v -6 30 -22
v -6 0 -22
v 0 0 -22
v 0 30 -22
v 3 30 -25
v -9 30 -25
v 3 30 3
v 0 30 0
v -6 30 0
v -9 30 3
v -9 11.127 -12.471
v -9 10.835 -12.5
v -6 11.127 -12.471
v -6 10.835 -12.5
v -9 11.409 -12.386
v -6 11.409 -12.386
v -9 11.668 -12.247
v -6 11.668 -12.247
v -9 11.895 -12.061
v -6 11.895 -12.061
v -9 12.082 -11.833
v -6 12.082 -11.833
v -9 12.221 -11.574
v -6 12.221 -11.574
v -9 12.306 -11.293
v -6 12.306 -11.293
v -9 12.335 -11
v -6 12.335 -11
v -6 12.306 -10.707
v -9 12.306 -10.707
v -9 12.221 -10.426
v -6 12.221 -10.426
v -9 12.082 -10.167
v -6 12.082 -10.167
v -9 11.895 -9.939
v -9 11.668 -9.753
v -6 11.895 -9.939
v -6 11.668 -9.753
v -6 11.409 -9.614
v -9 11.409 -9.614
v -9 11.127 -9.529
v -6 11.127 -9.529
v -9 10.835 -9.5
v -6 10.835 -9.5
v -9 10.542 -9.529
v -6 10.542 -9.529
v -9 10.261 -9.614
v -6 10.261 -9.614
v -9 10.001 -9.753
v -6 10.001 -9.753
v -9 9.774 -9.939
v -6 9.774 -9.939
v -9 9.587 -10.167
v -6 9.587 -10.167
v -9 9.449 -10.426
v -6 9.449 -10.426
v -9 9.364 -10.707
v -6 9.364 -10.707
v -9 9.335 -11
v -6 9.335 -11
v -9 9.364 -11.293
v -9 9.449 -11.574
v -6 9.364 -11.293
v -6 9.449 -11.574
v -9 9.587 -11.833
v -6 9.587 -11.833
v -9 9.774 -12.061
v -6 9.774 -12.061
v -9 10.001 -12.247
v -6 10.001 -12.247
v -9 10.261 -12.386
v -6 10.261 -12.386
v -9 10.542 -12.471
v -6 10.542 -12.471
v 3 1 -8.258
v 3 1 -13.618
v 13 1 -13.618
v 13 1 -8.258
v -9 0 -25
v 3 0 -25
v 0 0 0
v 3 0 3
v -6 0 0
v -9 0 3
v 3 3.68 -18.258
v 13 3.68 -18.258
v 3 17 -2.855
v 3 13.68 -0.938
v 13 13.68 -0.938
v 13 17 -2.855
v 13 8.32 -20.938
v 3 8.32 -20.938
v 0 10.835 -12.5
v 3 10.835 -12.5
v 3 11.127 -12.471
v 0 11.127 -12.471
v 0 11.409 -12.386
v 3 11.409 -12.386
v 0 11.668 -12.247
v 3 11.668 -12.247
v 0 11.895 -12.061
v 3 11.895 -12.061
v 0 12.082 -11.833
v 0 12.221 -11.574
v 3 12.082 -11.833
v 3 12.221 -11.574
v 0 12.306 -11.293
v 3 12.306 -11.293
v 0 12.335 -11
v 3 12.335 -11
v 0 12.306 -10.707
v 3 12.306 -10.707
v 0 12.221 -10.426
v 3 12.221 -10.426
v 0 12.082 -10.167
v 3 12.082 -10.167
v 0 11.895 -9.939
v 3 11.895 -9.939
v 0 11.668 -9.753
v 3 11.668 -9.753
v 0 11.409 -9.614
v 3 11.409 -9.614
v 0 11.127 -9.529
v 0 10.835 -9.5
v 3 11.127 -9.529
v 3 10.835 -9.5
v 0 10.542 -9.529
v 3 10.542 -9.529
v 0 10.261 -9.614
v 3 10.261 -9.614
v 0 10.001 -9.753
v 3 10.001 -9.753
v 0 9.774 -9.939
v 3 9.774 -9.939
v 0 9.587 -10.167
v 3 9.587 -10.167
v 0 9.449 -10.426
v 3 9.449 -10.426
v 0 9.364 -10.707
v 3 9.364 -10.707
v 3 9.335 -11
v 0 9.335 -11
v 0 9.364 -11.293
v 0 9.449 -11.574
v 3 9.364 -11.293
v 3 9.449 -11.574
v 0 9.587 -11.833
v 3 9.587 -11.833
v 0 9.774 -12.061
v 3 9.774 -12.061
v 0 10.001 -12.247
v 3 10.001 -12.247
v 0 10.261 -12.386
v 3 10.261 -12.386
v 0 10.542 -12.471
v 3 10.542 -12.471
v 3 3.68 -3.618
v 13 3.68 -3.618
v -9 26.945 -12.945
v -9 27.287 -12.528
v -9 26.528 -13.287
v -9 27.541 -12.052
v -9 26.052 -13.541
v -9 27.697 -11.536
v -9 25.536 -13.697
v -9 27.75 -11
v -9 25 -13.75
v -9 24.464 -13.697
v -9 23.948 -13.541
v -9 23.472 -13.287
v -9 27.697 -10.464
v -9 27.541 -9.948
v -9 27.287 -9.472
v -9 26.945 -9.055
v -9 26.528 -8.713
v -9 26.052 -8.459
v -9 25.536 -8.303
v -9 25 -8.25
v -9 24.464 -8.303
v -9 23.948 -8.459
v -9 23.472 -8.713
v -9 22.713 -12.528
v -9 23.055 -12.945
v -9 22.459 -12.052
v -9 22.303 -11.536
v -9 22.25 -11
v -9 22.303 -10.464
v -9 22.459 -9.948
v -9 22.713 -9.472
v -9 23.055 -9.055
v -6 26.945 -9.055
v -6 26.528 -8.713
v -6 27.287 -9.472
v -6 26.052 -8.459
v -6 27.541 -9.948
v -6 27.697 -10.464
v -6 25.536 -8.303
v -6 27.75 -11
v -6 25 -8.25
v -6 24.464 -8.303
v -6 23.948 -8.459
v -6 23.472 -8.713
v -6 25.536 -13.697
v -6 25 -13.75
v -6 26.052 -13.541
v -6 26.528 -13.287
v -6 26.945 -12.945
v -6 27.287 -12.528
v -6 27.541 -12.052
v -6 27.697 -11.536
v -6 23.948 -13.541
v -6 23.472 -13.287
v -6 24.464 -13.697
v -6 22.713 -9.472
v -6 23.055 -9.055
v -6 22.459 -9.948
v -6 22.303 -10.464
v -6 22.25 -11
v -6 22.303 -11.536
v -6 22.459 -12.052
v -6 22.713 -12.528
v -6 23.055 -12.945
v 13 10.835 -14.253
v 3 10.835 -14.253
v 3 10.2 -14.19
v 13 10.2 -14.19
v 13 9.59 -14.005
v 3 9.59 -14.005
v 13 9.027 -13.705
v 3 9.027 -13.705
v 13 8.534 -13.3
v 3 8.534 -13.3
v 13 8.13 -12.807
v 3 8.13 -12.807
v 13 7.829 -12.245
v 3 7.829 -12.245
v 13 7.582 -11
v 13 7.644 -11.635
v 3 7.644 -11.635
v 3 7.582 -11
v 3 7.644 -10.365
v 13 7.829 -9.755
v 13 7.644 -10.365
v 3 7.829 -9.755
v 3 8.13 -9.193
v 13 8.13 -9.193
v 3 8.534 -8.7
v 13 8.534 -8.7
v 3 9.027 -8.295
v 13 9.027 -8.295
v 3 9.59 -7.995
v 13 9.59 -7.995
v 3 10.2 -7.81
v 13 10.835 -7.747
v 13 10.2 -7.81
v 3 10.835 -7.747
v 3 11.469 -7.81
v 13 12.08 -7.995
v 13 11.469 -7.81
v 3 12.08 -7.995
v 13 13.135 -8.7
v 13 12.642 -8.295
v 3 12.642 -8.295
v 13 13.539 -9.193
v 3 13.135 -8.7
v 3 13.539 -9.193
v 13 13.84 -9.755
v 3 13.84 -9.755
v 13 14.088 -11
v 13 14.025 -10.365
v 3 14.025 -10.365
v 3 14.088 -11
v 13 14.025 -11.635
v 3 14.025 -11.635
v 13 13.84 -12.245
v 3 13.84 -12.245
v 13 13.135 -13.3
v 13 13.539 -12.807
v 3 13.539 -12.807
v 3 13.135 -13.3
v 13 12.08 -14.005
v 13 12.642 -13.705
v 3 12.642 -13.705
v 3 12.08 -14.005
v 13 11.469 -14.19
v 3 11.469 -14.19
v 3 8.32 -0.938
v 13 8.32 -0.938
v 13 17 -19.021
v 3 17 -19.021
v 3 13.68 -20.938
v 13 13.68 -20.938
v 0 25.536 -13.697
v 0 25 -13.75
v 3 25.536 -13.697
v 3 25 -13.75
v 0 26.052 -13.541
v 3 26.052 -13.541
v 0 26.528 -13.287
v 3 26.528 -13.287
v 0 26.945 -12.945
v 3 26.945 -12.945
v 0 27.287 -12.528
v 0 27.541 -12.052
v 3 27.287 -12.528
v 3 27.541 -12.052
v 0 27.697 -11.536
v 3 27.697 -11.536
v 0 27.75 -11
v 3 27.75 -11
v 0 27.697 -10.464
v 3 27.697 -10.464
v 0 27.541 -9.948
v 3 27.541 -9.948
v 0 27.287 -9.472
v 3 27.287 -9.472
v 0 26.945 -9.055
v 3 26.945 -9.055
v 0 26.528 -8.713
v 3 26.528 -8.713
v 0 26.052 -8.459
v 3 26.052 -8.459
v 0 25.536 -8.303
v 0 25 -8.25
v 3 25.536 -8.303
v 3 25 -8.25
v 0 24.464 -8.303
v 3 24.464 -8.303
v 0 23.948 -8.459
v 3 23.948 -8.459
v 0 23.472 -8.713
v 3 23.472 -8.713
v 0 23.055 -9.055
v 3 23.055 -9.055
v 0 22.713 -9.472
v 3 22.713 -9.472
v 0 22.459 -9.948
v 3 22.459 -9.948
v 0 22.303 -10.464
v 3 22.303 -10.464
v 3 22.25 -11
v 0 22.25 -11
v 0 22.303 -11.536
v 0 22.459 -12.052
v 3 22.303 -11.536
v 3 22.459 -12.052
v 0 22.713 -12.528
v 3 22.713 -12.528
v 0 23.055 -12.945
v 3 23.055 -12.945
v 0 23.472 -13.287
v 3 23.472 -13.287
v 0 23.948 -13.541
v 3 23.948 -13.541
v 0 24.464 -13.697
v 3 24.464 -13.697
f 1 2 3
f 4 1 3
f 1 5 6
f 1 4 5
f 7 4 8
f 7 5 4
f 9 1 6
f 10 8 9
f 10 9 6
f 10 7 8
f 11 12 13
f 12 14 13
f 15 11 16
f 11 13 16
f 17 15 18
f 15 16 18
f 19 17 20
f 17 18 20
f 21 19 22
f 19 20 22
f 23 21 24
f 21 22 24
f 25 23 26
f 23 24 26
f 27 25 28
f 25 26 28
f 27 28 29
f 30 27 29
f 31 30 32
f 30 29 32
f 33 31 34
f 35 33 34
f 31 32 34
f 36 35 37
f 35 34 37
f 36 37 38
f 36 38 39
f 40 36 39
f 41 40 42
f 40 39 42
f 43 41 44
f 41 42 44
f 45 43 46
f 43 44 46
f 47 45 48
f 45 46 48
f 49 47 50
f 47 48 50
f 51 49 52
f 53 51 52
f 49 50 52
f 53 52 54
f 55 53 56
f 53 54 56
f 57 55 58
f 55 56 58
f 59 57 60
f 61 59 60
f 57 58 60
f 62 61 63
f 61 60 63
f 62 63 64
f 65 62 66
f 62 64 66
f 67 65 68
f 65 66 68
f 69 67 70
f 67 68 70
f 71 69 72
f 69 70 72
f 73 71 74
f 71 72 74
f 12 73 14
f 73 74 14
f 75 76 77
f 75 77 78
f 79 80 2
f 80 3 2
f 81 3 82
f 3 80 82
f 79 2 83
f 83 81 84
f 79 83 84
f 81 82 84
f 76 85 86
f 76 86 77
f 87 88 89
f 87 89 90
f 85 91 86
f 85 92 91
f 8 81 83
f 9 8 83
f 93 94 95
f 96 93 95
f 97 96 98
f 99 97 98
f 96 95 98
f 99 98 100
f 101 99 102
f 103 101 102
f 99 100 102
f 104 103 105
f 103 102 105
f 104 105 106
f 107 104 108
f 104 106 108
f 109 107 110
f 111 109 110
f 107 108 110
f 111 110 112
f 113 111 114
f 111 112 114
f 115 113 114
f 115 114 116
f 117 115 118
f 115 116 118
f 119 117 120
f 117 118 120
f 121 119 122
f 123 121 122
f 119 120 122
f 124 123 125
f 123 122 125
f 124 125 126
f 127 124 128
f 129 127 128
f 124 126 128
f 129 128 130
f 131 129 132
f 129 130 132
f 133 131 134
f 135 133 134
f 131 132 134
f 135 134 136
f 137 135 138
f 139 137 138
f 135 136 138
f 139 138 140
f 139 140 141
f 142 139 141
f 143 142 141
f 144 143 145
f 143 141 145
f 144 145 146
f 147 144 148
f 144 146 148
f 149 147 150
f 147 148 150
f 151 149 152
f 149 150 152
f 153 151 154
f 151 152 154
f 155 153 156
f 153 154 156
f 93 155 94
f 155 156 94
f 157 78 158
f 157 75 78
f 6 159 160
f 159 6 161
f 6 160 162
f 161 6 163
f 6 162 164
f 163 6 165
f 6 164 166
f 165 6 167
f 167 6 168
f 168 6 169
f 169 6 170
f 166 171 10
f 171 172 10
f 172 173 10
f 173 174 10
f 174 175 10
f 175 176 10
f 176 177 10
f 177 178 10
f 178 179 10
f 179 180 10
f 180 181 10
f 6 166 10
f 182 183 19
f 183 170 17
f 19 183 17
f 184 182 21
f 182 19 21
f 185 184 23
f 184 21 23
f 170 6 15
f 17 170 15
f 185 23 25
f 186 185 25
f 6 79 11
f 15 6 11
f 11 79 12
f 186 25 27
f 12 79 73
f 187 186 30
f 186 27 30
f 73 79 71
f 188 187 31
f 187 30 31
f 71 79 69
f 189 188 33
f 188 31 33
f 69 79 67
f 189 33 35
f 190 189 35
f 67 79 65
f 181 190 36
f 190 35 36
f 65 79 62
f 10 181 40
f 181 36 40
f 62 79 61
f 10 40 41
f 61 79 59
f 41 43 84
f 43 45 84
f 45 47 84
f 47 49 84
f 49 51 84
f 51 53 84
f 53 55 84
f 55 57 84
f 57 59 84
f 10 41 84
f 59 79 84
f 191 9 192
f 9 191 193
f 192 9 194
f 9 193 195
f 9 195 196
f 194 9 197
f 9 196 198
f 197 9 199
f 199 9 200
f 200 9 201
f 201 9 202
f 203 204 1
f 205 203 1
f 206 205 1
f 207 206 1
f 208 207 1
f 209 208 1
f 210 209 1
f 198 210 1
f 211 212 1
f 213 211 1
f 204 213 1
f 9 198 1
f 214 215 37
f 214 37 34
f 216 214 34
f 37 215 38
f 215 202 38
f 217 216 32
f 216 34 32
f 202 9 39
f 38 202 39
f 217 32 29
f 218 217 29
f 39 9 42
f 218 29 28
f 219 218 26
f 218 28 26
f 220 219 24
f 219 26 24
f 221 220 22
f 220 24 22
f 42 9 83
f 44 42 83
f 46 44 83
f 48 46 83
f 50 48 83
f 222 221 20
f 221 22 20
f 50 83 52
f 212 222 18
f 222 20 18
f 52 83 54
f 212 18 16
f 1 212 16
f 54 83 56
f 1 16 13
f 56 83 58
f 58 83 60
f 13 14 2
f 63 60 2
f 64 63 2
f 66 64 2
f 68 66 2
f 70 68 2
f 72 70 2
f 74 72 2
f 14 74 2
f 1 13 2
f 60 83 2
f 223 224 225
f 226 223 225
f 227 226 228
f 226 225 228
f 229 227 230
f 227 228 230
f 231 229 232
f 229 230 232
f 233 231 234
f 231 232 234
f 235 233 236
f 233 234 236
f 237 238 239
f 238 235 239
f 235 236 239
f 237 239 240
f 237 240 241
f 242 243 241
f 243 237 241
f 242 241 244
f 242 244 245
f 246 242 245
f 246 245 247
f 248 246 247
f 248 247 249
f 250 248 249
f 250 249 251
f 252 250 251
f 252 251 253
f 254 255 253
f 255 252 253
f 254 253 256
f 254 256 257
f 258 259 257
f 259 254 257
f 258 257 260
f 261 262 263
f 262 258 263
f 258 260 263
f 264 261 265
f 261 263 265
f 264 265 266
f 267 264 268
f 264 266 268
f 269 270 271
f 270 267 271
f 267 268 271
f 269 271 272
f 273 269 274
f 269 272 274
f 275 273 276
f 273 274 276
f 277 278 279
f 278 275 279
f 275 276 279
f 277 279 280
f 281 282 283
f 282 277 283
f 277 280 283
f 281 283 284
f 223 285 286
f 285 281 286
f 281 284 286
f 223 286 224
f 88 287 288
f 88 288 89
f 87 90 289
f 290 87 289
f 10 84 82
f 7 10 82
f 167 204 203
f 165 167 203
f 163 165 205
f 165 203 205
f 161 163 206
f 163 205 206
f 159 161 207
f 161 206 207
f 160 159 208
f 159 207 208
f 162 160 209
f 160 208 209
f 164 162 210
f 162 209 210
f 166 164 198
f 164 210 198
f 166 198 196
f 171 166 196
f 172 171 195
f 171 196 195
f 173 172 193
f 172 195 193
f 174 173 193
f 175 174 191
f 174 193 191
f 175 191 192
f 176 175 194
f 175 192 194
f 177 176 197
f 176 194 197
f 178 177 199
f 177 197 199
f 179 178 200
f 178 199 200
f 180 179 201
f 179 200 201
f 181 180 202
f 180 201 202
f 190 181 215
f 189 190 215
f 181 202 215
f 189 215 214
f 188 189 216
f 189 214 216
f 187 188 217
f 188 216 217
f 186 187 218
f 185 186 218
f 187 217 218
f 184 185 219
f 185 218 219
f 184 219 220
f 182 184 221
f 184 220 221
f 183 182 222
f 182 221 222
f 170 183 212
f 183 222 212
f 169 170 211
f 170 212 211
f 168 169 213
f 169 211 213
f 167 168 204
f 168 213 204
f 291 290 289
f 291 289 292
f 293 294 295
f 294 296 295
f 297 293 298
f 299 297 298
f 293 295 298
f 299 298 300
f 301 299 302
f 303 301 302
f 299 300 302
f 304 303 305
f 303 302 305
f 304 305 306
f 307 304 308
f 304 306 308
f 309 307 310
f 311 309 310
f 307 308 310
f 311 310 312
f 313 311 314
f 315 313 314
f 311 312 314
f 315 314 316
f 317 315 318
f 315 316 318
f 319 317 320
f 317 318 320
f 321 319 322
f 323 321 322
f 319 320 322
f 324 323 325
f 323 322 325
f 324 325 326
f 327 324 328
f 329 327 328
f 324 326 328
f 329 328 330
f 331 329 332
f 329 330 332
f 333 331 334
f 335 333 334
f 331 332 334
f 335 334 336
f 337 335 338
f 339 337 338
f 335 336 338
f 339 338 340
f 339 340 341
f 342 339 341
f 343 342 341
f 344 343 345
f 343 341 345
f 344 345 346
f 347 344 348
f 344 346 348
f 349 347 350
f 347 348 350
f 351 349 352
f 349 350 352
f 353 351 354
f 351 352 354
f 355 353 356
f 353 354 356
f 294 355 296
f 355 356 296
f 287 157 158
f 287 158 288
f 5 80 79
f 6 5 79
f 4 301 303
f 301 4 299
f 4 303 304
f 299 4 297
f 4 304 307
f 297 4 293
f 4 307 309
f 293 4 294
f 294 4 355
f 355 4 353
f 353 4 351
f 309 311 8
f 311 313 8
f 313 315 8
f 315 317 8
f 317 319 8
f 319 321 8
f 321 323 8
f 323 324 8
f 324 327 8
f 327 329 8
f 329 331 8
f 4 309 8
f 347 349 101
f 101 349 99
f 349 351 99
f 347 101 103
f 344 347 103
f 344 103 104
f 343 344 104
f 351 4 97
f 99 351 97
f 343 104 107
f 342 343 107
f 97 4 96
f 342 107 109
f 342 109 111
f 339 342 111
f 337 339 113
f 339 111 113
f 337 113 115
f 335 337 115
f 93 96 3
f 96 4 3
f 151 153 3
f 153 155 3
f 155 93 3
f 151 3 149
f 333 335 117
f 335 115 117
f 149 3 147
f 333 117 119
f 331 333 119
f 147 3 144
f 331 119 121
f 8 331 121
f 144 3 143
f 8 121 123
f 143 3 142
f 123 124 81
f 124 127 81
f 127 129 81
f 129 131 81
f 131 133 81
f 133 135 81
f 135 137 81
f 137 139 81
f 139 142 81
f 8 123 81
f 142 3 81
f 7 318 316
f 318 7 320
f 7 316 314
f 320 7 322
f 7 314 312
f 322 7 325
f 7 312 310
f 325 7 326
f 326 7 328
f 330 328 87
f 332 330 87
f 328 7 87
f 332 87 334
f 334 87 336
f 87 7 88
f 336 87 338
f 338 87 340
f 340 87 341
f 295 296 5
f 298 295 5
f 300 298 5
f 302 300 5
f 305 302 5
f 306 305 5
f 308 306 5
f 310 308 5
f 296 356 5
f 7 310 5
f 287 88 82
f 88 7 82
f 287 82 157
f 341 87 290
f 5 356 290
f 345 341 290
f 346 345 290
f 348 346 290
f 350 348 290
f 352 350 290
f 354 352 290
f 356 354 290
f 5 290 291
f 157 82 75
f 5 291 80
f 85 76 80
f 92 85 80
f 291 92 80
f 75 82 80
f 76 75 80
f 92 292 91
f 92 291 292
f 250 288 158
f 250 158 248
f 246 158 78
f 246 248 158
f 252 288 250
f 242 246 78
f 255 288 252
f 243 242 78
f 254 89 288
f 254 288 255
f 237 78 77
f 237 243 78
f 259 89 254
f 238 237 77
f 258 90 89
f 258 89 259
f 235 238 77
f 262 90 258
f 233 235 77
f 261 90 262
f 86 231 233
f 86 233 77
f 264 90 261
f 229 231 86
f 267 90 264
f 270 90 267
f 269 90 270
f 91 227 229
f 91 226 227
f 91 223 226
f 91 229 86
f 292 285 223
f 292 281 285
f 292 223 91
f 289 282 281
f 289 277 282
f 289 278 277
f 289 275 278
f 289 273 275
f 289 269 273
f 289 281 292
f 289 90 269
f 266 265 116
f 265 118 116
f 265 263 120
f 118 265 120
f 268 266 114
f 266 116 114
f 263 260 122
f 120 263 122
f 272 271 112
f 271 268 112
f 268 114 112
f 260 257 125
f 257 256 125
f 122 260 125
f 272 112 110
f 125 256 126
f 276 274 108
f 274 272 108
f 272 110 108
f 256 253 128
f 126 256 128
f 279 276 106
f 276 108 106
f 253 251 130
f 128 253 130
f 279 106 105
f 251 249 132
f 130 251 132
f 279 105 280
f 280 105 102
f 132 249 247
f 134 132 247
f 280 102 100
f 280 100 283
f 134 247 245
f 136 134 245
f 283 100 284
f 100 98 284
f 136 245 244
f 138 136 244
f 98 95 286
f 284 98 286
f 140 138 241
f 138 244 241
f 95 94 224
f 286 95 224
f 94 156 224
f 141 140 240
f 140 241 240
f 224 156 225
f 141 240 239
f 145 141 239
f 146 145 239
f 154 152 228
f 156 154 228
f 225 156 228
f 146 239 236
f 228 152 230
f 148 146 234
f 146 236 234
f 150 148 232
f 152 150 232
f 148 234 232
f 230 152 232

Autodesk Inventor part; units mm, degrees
ref_plane "YZ Plane" through (0, 0, 0) normal (1, 0, 0) x (0, 1, 0)
ref_plane "XZ Plane" through (0, 0, 0) normal (0, 1, 0) x (-1, 0, 0)
ref_plane "XY Plane" through (0, 0, 0) normal (0, 0, 1) x (1, 0, 0)
sketch "Sketch1" plane through (0, 0, 0) normal (0, 1, 0) x (-1, 0, 0)
  line L0 (0, 0) -> (6, 0)
  line L1 (6, 0) -> (6, -22)
  line L2 (6, -22) -> (0, -22)
  line L3 (0, -22) -> (0, 0)
  line L4 (9, 3) -> (-3, 3)
  line L5 (-3, 3) -> (-3, -25)
  line L6 (-3, -25) -> (9, -25)
  line L7 (9, -25) -> (9, 3)
  point P0 (3, 0)
  point P1 (3, -25)
  dimension "d0" = 22
  dimension "d1" = 6
  dimension "d2" = 3
  dimension "d3" = 3
  dimension "d4" = 3
  dimension "d5" = 3
extrude "Extrusion1" add sketch "Sketch1" along normal blind 30
sketch "Sketch2" plane through (3, 0, 3) normal (1, 0, 0) x (0, 0, -1)
  circle A0 centre (14, 25) radius 2.75
  line L0 (0, 30) -> (28, 30) projected
  point P0 (3, 0)
  dimension "d8" = 5.5
  dimension "d11" = 5
extrude "Extrusion2" cut sketch "Sketch2" against normal blind 30
sketch "Sketch3" plane through (3, 0, 3) normal (1, 0, 0) x (0, 0, -1)
  line L0 (6.6175, 3.6795) -> (3.938, 8.3205)
  line L1 (3.938, 8.3205) -> (3.938, 13.6795)
  line L2 (3.938, 13.6795) -> (6.6175, 18.3205)
  line L3 (6.6175, 18.3205) -> (11.2585, 21)
  line L4 (11.2585, 21) -> (16.6175, 21)
  line L5 (16.6175, 21) -> (21.2585, 18.3205)
  line L6 (21.2585, 18.3205) -> (23.938, 13.6795)
  line L7 (23.938, 13.6795) -> (23.938, 8.3205)
  line L8 (23.938, 8.3205) -> (21.2585, 3.6795)
  line L9 (21.2585, 3.6795) -> (16.6175, 1)
  line L10 (16.6175, 1) -> (11.2585, 1)
  line L11 (11.2585, 1) -> (6.6175, 3.6795)
  line L12 (0, 30) -> (28, 30) projected
  circle A0 centre (14, 10.8347) radius 3.253
  point P0 (3, 0)
  point P1 (13.938, 11)
  dimension "d12" = 10
  dimension "d13" = 19
extrude "Extrusion3" add sketch "Sketch3" along normal blind 10
sketch "Sketch5" plane through (3, 10.8347, -11) normal (1, 0, 0) x (0, 0, -1)
  circle A0 centre (0, 0) radius 1.5
  point P0 (-11, -10.8347)
  dimension "d18" = 3
extrude "Extrusion5" cut sketch "Sketch5" against normal blind 12
sketch "Sketch6" plane through (13, 0, 3) normal (1, 0, 0) x (0, 0, -1)
  line L0 (23, 22) -> (5, 22)
  line L1 (5, 22) -> (5, 17)
  line L2 (5, 17) -> (23, 17)
  line L3 (23, 17) -> (23, 22)
  line L4 (28, 0) -> (28, 30) projected
  line L5 (0, 0) -> (0, 30) projected
  line L6 (0, 30) -> (28, 30) projected
  point P0 (3, 0)
  dimension "d21" = 5
  dimension "d22" = 5
  dimension "d23" = 5
  dimension "d24" = 8
extrude "Extrusion6" cut sketch "Sketch6" against normal blind 10
equation "\"d22\" = d21"
properties part number "RollY" material "Thermoplastic Resin"
